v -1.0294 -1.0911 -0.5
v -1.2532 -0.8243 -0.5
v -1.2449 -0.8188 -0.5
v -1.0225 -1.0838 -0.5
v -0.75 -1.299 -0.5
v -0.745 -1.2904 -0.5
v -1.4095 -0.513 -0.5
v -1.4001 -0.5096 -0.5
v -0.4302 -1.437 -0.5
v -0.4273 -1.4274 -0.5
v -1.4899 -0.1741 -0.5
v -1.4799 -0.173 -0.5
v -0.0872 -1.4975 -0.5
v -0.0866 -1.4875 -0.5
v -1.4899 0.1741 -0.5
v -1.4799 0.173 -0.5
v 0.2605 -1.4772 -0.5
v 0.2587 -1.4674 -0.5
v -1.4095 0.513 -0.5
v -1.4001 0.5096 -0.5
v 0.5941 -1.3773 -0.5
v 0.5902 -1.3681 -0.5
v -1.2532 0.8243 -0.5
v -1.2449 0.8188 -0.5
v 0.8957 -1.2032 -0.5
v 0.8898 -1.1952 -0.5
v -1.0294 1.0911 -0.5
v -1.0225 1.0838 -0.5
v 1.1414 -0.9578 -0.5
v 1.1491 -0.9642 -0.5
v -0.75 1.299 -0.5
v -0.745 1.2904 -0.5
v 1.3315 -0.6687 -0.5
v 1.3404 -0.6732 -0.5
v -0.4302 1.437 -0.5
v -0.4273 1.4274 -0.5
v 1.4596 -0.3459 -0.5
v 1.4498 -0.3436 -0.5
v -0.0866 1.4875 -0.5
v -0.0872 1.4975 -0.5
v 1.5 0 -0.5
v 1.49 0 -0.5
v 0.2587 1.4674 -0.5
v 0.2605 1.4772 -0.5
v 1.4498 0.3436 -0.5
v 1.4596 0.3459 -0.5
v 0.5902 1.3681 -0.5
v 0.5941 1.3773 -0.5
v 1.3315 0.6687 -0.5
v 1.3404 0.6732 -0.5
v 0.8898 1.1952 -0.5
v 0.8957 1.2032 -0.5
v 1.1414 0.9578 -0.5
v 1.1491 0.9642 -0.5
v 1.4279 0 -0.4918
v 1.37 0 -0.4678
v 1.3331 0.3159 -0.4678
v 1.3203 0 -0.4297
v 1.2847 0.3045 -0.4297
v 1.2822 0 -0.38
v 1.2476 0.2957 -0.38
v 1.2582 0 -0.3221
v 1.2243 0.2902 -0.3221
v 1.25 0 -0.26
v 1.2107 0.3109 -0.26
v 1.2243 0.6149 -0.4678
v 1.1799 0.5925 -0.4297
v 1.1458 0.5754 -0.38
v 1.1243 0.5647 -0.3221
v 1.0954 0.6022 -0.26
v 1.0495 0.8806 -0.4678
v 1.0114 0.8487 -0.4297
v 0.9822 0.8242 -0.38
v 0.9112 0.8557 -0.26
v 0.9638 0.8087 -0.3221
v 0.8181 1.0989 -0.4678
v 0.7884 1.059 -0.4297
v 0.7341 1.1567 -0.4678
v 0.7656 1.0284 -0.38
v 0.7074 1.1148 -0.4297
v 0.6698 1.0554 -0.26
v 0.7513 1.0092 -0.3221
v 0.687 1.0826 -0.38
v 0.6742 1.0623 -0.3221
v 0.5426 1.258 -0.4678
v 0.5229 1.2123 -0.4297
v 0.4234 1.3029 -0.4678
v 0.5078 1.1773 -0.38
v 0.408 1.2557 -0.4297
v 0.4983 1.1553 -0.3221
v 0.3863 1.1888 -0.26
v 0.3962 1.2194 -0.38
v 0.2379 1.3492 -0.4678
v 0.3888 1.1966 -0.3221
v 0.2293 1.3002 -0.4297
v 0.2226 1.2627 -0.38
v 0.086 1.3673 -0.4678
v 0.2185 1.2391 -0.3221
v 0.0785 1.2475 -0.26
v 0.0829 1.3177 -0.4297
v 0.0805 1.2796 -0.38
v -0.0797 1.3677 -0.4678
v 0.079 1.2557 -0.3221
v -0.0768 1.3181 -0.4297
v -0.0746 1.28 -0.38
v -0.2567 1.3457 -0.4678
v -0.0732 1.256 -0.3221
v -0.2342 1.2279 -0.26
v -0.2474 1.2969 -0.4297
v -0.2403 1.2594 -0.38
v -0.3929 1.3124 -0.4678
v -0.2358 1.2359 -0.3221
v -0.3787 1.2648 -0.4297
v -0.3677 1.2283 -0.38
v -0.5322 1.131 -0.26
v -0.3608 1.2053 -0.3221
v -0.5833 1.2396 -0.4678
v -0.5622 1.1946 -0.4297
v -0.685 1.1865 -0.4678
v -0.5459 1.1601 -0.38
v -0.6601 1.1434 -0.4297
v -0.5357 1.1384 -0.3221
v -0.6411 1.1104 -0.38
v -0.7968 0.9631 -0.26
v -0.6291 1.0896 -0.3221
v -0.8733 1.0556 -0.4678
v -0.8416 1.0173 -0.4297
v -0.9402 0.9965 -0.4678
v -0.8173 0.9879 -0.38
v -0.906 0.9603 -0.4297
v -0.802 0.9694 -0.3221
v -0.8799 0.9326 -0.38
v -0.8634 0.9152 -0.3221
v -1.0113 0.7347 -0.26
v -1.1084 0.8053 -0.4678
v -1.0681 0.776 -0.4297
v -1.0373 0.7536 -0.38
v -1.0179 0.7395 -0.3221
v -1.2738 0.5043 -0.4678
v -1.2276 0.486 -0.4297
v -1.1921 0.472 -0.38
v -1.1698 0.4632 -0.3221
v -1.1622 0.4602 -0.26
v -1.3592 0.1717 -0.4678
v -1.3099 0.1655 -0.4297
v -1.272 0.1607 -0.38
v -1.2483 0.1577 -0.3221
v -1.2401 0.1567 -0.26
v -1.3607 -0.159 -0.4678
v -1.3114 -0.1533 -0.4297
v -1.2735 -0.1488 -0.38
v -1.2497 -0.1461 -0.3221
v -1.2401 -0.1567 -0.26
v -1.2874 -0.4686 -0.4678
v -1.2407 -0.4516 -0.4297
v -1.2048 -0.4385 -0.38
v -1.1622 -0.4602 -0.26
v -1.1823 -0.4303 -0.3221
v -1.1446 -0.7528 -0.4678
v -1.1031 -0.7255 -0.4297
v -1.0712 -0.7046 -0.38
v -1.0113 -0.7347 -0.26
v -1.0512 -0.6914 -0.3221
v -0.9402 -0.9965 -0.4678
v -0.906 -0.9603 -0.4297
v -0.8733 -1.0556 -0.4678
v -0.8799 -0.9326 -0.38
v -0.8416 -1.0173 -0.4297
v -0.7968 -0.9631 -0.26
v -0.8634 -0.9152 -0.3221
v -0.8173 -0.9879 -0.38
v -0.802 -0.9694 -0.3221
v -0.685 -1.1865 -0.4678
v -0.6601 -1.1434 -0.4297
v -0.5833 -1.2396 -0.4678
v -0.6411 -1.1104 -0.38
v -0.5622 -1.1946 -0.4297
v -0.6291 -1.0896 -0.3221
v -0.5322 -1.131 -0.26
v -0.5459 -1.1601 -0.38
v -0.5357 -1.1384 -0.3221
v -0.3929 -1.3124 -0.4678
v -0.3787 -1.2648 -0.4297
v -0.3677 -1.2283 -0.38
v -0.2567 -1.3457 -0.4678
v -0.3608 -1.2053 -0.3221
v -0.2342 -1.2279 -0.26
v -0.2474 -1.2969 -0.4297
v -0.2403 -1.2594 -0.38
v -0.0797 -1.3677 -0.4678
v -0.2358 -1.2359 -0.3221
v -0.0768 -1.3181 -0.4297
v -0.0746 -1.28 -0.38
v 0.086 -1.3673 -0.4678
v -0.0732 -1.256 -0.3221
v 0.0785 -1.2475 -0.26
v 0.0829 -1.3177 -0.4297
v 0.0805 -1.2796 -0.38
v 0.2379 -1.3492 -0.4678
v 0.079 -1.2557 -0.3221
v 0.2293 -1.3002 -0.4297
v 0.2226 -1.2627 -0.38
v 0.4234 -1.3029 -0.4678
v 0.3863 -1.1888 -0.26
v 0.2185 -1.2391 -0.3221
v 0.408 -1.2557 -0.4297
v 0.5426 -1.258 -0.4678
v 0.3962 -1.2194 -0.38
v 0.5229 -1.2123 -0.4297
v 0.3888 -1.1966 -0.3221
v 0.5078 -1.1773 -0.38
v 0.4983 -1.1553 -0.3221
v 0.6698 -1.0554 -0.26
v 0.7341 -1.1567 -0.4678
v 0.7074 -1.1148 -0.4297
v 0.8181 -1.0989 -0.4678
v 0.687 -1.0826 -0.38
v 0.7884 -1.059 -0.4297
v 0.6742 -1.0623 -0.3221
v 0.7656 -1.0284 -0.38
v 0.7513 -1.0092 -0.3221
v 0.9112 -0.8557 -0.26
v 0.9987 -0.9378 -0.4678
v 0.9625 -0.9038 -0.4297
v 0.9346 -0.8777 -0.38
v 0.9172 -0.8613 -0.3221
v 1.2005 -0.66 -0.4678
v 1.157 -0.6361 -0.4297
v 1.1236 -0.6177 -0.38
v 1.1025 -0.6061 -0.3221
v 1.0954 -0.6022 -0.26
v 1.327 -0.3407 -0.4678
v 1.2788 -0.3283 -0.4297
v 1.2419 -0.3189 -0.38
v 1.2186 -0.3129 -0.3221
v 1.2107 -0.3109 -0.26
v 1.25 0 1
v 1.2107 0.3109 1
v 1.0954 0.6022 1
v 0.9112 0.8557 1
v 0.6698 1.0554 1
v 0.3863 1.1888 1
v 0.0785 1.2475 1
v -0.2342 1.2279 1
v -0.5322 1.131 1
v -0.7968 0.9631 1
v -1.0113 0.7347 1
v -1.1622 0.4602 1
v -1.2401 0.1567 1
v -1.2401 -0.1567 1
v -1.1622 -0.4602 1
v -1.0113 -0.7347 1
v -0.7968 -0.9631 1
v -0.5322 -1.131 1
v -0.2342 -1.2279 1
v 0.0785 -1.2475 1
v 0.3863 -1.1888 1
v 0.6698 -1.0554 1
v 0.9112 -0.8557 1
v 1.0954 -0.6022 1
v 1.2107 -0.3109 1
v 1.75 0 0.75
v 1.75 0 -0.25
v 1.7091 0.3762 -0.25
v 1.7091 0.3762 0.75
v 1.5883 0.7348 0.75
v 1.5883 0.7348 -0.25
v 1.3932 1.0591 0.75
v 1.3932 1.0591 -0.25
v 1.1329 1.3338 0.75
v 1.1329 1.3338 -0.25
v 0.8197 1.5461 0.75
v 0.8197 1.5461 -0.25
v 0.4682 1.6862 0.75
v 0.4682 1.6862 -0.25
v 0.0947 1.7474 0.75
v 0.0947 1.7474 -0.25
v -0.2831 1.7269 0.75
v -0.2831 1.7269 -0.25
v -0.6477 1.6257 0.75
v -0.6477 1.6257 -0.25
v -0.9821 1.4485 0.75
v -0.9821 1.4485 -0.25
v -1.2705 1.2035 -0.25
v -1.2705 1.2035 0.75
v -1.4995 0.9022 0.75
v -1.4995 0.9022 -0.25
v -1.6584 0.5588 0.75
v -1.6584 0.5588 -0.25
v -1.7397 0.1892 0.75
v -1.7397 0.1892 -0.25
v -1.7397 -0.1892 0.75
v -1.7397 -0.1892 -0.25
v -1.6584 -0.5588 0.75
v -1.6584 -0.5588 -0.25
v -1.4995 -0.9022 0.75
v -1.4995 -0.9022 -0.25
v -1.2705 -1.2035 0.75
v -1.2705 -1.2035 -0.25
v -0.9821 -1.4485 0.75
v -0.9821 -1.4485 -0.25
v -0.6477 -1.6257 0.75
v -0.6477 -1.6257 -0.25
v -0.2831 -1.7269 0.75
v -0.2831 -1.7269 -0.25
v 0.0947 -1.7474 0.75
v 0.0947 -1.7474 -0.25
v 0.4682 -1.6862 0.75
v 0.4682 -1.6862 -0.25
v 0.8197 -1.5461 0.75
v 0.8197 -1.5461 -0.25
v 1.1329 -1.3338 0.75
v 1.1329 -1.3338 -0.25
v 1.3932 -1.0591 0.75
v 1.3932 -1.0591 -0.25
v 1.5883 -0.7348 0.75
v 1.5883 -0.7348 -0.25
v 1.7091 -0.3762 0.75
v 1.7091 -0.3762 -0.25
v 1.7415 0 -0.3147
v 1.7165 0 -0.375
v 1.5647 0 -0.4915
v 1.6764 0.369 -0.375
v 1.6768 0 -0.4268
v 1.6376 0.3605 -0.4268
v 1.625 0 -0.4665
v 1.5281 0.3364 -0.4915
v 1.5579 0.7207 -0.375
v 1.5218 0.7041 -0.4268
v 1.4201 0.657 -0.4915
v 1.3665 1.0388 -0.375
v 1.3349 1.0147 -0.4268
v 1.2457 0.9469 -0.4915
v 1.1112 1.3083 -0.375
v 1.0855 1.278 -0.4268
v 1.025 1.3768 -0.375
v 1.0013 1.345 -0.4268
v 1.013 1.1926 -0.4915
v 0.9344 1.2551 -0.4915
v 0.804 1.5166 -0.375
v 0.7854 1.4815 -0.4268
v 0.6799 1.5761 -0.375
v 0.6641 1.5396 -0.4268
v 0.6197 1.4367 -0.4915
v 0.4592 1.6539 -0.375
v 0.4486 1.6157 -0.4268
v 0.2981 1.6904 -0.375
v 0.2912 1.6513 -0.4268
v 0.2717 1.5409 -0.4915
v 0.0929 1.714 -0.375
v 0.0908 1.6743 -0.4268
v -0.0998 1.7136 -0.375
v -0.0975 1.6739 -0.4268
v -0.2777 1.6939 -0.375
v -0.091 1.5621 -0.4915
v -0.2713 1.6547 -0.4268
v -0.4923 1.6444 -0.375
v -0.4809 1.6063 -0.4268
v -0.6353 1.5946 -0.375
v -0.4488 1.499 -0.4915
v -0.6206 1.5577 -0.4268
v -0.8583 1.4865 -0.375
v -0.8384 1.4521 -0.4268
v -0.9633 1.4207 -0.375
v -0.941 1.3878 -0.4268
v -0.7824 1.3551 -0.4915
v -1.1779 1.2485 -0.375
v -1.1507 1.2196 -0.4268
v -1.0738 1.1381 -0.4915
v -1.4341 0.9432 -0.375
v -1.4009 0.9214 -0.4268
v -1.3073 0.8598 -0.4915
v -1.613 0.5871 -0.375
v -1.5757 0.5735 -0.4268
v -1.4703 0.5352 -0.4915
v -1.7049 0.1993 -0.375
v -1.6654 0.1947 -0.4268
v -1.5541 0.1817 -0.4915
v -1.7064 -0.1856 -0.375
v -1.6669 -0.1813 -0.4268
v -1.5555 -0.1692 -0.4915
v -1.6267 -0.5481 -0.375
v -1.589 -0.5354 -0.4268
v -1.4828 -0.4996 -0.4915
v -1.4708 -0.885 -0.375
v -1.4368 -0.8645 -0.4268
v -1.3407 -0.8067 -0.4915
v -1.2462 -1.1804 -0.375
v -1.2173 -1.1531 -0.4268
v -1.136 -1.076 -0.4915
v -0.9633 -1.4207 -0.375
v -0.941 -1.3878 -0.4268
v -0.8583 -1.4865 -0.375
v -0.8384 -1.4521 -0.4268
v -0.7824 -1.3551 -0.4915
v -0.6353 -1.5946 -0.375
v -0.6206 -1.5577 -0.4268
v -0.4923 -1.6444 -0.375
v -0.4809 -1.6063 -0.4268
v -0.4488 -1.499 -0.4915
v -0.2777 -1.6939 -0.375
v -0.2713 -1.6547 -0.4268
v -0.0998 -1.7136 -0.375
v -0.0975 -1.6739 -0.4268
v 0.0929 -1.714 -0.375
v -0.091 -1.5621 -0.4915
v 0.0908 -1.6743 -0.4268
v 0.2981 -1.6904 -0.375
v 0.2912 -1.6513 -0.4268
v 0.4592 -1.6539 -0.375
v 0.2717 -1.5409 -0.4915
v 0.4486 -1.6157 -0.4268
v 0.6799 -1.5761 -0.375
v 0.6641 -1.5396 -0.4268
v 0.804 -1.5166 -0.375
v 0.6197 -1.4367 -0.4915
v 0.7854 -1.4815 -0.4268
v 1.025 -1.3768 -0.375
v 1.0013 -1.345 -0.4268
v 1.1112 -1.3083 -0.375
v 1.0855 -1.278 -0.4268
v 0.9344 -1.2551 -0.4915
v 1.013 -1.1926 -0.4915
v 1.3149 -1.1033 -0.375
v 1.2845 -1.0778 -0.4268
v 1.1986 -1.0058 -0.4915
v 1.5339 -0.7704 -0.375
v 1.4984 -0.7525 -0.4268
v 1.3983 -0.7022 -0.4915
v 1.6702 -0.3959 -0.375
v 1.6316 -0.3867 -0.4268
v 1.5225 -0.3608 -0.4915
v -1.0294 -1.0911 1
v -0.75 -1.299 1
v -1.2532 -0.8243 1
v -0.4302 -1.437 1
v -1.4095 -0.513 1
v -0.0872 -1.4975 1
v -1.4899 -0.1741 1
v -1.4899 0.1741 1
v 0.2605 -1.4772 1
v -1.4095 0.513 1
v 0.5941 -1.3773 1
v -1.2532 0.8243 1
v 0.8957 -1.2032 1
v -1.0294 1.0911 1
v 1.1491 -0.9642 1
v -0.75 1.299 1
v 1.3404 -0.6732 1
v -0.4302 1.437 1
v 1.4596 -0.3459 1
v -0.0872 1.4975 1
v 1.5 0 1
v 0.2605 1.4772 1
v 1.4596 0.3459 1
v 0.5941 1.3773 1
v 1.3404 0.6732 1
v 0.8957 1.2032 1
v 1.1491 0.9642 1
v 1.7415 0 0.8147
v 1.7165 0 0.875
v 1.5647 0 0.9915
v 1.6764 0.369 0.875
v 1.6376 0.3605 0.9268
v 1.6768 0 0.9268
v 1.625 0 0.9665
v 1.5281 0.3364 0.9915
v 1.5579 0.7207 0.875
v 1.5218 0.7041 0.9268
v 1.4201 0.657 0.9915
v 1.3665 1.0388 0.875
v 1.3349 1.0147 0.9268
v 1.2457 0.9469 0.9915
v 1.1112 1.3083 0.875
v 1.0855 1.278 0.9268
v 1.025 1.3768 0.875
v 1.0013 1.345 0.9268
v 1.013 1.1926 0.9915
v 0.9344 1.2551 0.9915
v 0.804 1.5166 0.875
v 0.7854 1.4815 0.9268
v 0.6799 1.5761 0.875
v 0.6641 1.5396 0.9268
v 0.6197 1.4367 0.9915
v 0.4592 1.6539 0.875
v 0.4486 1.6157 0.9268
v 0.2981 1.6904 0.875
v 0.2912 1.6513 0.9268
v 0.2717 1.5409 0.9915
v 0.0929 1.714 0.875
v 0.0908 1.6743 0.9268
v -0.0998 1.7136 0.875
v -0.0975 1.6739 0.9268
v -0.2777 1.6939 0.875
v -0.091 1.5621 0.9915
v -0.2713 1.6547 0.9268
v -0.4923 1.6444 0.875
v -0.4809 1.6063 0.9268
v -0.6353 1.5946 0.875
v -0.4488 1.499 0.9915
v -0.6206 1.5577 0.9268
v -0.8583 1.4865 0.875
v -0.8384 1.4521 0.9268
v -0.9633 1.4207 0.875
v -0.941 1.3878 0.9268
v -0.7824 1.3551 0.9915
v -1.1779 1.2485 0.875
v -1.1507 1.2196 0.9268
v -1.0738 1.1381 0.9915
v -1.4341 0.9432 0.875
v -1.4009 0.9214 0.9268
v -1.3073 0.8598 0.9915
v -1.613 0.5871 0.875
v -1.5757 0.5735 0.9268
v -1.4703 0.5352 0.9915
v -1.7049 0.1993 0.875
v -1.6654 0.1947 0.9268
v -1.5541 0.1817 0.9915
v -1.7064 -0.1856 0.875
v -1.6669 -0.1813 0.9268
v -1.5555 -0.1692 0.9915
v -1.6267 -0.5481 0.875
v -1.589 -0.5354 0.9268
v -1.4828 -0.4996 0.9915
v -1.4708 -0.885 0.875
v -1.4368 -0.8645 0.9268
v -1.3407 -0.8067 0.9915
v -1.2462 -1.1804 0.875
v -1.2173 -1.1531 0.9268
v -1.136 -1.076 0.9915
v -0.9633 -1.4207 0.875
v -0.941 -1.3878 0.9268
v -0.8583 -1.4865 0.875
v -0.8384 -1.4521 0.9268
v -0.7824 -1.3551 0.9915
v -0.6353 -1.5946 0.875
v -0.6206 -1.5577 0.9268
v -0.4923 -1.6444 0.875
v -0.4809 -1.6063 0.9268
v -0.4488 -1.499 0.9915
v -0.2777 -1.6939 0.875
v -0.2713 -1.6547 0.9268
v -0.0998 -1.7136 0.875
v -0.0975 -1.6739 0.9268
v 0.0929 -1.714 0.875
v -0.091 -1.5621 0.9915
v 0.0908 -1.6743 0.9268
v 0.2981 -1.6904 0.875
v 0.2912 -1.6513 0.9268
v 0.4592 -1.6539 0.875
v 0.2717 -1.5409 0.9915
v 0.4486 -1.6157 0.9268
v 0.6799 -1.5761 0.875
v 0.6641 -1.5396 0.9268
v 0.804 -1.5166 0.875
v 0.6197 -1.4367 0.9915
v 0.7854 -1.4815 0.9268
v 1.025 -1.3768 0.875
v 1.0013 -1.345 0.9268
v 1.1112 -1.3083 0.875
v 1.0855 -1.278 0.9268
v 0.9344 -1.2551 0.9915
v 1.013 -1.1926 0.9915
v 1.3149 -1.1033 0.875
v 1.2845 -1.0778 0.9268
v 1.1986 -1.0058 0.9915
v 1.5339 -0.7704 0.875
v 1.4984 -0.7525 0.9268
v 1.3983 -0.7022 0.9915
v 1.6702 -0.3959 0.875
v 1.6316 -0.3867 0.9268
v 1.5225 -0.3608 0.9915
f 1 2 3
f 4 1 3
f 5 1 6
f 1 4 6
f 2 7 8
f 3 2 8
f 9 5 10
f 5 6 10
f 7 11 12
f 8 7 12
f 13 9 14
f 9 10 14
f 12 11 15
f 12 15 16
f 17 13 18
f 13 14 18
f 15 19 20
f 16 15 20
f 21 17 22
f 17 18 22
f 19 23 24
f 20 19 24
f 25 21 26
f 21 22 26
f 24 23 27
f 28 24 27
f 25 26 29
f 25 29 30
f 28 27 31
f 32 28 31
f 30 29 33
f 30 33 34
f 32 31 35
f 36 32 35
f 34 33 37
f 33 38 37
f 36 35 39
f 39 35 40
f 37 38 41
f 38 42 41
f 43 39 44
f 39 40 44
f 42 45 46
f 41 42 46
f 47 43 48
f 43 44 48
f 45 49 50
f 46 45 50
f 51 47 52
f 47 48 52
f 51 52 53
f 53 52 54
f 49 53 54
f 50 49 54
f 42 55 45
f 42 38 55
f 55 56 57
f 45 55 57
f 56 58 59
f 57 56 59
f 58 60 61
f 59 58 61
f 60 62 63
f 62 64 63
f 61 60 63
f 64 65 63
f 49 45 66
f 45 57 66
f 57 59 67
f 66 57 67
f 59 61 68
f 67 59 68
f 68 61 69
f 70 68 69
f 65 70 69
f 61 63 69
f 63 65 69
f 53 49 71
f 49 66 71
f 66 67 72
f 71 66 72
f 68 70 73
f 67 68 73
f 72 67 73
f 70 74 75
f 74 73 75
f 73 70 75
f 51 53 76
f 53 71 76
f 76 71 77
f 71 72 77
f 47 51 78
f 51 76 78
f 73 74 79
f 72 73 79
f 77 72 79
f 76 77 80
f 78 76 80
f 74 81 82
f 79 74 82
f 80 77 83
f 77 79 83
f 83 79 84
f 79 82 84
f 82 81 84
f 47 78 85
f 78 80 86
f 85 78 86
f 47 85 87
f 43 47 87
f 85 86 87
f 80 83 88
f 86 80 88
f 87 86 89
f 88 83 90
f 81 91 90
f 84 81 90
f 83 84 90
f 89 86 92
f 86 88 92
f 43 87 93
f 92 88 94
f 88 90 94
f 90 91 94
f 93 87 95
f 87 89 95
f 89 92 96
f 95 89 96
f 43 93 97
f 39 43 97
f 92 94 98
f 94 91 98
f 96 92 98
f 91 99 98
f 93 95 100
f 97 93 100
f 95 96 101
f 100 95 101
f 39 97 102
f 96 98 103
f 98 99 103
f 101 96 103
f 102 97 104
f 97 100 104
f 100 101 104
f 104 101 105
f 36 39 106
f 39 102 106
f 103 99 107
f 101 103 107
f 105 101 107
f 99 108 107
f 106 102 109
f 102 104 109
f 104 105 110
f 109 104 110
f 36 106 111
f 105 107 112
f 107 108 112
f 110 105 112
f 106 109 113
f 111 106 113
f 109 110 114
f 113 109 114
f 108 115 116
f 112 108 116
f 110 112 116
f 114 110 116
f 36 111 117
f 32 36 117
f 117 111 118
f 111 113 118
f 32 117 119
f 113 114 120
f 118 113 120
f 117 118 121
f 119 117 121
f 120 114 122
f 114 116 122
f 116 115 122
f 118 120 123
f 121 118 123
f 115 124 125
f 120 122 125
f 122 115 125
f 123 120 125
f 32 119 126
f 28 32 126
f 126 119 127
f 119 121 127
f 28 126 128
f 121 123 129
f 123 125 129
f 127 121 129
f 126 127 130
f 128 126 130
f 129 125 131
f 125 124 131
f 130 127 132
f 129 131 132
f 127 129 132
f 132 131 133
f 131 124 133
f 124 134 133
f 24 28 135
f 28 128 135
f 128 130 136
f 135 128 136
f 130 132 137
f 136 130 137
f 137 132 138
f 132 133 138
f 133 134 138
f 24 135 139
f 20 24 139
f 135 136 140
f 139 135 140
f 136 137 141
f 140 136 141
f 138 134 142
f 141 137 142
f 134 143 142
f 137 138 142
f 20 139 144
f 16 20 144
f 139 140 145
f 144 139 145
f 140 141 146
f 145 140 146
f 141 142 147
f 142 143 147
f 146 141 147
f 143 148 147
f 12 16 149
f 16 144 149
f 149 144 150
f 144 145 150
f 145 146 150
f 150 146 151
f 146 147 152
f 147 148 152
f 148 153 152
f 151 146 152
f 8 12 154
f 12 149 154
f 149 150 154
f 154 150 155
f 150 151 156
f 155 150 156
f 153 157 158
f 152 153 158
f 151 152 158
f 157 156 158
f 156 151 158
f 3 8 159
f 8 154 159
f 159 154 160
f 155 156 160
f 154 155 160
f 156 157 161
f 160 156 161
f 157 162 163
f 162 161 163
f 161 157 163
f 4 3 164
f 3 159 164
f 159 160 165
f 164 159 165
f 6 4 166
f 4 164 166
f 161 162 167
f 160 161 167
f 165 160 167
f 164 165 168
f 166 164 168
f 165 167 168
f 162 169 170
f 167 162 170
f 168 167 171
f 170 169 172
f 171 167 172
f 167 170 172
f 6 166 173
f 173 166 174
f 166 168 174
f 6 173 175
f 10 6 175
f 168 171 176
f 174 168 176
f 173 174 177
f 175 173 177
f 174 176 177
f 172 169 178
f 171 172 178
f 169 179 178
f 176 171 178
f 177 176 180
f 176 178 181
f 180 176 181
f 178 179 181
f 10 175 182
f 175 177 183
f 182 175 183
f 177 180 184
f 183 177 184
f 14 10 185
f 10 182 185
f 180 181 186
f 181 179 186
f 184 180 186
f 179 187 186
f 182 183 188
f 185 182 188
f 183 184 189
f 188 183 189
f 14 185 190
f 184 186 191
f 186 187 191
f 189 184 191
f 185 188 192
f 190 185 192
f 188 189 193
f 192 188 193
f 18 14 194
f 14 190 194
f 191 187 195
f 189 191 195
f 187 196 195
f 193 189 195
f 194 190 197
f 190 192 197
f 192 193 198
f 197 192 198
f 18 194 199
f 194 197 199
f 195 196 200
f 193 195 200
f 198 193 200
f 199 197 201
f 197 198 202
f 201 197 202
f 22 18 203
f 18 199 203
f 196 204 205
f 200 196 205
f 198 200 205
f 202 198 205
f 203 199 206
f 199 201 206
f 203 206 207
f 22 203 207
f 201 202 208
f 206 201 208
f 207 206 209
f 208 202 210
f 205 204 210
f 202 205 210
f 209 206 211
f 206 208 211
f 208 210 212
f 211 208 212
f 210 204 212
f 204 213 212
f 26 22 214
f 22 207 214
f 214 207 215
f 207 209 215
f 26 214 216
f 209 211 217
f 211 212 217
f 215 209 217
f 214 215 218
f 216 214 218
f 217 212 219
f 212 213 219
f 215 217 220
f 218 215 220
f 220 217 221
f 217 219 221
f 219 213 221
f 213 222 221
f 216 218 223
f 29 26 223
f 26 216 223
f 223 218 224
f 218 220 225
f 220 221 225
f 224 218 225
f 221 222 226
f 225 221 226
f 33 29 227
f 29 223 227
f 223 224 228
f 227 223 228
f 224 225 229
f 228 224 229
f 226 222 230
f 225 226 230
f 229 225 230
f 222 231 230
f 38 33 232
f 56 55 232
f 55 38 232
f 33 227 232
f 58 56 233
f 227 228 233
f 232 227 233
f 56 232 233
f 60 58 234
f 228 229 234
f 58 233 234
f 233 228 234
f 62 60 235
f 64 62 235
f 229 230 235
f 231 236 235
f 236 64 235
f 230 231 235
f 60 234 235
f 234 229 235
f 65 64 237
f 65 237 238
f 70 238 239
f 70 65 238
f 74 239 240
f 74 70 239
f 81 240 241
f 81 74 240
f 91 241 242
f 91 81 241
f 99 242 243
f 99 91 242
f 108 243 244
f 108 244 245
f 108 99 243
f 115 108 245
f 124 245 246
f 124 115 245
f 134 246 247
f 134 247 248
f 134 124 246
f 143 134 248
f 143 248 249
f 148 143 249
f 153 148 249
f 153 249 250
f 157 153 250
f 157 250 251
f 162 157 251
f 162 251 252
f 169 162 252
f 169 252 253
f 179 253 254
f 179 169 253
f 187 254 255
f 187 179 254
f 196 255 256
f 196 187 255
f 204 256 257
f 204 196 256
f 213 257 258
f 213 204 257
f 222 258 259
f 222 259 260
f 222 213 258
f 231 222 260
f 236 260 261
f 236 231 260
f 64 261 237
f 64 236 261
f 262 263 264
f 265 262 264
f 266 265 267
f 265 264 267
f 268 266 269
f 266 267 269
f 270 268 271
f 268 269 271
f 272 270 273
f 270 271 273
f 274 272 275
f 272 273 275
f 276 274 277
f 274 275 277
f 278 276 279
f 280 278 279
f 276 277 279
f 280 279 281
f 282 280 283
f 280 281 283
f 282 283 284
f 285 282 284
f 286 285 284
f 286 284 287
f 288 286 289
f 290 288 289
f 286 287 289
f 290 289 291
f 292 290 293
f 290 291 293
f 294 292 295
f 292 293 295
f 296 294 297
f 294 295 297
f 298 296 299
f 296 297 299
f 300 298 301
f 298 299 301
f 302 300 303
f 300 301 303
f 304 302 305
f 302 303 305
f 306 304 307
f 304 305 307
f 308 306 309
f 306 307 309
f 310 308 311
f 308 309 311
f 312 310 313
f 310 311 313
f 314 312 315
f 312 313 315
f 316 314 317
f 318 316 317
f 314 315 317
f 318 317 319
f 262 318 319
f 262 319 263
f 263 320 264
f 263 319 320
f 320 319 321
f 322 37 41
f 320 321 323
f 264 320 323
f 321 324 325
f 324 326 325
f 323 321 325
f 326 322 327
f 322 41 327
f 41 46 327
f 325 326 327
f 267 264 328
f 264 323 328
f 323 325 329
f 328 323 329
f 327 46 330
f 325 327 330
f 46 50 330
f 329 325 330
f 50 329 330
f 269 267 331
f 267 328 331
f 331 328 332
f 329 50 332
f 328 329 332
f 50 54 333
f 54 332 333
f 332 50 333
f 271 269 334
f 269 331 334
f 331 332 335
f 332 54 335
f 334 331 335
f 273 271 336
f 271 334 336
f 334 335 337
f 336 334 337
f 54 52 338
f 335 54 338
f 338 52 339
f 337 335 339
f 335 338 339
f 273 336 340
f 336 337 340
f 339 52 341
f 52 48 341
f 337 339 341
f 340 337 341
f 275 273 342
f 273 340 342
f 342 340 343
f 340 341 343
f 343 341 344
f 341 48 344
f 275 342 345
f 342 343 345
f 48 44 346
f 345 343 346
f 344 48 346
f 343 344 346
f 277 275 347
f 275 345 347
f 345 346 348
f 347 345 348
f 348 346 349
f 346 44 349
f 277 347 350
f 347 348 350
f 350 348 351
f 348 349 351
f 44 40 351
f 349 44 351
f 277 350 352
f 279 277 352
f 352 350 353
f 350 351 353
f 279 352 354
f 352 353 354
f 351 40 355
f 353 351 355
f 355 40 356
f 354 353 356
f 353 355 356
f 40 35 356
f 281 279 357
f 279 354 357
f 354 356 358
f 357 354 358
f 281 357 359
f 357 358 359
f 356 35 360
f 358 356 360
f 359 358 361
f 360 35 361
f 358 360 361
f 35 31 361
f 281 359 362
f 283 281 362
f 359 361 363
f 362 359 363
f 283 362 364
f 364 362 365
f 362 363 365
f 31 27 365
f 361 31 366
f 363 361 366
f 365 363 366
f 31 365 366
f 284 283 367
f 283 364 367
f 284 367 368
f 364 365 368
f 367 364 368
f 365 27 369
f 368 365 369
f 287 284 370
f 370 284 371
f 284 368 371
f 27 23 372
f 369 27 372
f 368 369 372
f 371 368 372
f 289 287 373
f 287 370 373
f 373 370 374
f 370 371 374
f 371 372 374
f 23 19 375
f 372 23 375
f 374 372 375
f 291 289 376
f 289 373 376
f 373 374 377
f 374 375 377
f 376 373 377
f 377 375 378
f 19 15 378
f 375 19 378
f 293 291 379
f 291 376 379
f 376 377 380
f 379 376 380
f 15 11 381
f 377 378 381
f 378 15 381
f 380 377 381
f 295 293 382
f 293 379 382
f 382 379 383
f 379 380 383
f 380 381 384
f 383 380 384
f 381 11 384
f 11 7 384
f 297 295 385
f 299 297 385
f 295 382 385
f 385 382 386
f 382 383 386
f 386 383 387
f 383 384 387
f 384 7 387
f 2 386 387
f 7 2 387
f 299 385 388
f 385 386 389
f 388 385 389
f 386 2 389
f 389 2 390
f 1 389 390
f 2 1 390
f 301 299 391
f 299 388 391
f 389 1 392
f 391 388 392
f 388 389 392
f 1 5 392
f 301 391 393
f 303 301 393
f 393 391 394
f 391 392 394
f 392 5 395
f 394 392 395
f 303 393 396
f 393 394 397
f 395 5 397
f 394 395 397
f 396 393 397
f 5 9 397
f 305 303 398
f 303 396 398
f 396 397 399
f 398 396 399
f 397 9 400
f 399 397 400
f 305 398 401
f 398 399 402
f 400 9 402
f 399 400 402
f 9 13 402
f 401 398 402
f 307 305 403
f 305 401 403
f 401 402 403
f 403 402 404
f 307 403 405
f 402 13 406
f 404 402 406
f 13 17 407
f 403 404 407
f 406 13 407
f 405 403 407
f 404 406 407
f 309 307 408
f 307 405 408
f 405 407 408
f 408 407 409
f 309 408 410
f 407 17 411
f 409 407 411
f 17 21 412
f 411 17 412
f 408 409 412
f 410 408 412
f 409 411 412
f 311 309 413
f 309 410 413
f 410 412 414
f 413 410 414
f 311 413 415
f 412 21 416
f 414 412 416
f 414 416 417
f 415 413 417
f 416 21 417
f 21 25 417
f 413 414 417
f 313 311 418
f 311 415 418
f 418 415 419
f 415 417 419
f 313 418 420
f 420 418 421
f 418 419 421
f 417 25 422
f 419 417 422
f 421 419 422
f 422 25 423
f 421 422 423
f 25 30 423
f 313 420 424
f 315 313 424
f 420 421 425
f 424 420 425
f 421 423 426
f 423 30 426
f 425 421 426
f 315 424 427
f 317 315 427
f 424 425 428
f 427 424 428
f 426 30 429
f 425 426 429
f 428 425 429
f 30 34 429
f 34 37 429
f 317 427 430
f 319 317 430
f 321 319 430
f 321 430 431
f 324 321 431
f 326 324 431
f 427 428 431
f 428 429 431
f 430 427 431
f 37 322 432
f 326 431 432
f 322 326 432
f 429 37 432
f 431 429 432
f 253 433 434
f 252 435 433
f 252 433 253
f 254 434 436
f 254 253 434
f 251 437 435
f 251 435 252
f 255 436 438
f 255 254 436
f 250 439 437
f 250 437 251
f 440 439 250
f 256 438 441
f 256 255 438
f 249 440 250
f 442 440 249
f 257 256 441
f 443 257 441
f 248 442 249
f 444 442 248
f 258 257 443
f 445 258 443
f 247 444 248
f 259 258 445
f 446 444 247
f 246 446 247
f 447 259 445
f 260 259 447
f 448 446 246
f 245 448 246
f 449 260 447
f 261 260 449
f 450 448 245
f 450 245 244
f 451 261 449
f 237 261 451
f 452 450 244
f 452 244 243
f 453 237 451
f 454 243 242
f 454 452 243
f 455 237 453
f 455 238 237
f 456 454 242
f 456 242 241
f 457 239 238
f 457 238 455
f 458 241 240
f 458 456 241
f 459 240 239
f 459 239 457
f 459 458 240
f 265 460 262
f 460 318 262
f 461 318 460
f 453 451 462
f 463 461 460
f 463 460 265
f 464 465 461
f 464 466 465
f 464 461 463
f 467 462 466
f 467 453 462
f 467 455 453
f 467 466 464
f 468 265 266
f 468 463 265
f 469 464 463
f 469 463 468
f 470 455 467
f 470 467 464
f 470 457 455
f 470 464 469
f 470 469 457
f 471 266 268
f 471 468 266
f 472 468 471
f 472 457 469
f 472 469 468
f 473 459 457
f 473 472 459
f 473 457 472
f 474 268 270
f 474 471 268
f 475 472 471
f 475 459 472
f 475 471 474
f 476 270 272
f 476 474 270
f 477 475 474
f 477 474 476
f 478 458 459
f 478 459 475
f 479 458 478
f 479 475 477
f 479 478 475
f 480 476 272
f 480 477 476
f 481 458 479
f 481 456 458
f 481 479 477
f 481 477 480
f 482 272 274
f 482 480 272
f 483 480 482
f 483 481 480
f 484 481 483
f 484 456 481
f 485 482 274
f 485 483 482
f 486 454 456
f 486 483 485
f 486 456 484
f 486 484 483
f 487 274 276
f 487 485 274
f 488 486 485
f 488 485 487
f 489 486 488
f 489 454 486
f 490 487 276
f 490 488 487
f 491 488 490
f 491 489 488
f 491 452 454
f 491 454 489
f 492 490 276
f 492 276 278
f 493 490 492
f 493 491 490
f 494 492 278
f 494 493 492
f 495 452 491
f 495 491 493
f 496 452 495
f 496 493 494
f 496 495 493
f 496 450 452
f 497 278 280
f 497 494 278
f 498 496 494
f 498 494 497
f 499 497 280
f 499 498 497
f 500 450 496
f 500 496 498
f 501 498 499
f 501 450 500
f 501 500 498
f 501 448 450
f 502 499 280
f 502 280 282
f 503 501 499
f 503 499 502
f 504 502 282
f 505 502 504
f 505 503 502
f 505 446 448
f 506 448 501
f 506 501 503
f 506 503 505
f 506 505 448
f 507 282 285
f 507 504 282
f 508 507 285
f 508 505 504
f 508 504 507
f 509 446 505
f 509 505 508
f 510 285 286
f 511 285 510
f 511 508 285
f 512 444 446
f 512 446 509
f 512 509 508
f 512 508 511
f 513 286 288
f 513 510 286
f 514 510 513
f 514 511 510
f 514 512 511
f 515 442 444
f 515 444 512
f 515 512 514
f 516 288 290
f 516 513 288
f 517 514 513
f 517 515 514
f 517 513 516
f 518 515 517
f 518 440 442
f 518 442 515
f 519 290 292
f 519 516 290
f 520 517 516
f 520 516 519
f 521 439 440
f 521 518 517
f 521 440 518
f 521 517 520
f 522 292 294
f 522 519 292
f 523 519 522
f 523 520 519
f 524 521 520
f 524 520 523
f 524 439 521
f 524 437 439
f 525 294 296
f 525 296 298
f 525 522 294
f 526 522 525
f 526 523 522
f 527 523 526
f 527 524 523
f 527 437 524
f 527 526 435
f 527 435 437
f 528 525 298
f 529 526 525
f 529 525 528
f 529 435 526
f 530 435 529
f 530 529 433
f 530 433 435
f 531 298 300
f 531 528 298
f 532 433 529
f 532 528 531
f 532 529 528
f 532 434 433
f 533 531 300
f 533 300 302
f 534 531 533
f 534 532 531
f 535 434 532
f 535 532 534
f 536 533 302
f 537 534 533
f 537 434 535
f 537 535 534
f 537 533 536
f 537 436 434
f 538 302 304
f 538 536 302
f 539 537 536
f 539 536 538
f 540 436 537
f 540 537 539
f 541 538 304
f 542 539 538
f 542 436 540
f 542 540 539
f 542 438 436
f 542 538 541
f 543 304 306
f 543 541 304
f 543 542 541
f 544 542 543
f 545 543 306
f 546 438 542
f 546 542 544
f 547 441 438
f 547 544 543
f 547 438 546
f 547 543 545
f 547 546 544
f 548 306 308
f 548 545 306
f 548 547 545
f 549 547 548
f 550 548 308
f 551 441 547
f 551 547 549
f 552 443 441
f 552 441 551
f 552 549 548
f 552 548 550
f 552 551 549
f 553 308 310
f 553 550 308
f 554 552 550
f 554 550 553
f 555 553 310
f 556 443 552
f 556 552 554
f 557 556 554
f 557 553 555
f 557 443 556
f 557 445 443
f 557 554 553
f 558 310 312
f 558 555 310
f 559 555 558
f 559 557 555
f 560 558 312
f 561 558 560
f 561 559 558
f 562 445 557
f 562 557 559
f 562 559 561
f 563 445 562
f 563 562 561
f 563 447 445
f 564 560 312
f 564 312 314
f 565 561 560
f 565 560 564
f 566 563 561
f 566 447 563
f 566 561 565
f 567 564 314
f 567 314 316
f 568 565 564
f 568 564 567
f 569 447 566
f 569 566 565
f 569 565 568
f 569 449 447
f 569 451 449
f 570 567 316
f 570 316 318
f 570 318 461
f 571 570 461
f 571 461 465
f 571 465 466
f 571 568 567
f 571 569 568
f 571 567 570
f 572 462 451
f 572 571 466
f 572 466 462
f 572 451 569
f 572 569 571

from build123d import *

# Parameters (mm, degrees)
TUBE003_R     = 1.75
TUBE003_R_2   = 1.25
TUBE003_DEPTH = 1.5
FILLET003_1_R = 0.25
FILLET003_2_R = 0.24


with BuildPart() as part:
    # Tube003 → Tube003 (new body)
    with BuildSketch(Plane.XY.offset(-0.5)):
        Circle(TUBE003_R)
        Circle(TUBE003_R_2, mode=Mode.SUBTRACT)
    extrude(amount=TUBE003_DEPTH)

    # Fillet003 1
    fillet003_1_edges = [part.edges().sort_by_distance(p)[0] for p in [
        (-1.75, 0, 1),
        (-1.75, 0, -0.5),
    ]]
    fillet(fillet003_1_edges, radius=FILLET003_1_R)

    # Fillet003 2
    fillet003_2_edges = [part.edges().sort_by_distance(p)[0] for p in [
        (-1.25, 0, -0.5),
    ]]
    fillet(fillet003_2_edges, radius=FILLET003_2_R)


solid = part.part
